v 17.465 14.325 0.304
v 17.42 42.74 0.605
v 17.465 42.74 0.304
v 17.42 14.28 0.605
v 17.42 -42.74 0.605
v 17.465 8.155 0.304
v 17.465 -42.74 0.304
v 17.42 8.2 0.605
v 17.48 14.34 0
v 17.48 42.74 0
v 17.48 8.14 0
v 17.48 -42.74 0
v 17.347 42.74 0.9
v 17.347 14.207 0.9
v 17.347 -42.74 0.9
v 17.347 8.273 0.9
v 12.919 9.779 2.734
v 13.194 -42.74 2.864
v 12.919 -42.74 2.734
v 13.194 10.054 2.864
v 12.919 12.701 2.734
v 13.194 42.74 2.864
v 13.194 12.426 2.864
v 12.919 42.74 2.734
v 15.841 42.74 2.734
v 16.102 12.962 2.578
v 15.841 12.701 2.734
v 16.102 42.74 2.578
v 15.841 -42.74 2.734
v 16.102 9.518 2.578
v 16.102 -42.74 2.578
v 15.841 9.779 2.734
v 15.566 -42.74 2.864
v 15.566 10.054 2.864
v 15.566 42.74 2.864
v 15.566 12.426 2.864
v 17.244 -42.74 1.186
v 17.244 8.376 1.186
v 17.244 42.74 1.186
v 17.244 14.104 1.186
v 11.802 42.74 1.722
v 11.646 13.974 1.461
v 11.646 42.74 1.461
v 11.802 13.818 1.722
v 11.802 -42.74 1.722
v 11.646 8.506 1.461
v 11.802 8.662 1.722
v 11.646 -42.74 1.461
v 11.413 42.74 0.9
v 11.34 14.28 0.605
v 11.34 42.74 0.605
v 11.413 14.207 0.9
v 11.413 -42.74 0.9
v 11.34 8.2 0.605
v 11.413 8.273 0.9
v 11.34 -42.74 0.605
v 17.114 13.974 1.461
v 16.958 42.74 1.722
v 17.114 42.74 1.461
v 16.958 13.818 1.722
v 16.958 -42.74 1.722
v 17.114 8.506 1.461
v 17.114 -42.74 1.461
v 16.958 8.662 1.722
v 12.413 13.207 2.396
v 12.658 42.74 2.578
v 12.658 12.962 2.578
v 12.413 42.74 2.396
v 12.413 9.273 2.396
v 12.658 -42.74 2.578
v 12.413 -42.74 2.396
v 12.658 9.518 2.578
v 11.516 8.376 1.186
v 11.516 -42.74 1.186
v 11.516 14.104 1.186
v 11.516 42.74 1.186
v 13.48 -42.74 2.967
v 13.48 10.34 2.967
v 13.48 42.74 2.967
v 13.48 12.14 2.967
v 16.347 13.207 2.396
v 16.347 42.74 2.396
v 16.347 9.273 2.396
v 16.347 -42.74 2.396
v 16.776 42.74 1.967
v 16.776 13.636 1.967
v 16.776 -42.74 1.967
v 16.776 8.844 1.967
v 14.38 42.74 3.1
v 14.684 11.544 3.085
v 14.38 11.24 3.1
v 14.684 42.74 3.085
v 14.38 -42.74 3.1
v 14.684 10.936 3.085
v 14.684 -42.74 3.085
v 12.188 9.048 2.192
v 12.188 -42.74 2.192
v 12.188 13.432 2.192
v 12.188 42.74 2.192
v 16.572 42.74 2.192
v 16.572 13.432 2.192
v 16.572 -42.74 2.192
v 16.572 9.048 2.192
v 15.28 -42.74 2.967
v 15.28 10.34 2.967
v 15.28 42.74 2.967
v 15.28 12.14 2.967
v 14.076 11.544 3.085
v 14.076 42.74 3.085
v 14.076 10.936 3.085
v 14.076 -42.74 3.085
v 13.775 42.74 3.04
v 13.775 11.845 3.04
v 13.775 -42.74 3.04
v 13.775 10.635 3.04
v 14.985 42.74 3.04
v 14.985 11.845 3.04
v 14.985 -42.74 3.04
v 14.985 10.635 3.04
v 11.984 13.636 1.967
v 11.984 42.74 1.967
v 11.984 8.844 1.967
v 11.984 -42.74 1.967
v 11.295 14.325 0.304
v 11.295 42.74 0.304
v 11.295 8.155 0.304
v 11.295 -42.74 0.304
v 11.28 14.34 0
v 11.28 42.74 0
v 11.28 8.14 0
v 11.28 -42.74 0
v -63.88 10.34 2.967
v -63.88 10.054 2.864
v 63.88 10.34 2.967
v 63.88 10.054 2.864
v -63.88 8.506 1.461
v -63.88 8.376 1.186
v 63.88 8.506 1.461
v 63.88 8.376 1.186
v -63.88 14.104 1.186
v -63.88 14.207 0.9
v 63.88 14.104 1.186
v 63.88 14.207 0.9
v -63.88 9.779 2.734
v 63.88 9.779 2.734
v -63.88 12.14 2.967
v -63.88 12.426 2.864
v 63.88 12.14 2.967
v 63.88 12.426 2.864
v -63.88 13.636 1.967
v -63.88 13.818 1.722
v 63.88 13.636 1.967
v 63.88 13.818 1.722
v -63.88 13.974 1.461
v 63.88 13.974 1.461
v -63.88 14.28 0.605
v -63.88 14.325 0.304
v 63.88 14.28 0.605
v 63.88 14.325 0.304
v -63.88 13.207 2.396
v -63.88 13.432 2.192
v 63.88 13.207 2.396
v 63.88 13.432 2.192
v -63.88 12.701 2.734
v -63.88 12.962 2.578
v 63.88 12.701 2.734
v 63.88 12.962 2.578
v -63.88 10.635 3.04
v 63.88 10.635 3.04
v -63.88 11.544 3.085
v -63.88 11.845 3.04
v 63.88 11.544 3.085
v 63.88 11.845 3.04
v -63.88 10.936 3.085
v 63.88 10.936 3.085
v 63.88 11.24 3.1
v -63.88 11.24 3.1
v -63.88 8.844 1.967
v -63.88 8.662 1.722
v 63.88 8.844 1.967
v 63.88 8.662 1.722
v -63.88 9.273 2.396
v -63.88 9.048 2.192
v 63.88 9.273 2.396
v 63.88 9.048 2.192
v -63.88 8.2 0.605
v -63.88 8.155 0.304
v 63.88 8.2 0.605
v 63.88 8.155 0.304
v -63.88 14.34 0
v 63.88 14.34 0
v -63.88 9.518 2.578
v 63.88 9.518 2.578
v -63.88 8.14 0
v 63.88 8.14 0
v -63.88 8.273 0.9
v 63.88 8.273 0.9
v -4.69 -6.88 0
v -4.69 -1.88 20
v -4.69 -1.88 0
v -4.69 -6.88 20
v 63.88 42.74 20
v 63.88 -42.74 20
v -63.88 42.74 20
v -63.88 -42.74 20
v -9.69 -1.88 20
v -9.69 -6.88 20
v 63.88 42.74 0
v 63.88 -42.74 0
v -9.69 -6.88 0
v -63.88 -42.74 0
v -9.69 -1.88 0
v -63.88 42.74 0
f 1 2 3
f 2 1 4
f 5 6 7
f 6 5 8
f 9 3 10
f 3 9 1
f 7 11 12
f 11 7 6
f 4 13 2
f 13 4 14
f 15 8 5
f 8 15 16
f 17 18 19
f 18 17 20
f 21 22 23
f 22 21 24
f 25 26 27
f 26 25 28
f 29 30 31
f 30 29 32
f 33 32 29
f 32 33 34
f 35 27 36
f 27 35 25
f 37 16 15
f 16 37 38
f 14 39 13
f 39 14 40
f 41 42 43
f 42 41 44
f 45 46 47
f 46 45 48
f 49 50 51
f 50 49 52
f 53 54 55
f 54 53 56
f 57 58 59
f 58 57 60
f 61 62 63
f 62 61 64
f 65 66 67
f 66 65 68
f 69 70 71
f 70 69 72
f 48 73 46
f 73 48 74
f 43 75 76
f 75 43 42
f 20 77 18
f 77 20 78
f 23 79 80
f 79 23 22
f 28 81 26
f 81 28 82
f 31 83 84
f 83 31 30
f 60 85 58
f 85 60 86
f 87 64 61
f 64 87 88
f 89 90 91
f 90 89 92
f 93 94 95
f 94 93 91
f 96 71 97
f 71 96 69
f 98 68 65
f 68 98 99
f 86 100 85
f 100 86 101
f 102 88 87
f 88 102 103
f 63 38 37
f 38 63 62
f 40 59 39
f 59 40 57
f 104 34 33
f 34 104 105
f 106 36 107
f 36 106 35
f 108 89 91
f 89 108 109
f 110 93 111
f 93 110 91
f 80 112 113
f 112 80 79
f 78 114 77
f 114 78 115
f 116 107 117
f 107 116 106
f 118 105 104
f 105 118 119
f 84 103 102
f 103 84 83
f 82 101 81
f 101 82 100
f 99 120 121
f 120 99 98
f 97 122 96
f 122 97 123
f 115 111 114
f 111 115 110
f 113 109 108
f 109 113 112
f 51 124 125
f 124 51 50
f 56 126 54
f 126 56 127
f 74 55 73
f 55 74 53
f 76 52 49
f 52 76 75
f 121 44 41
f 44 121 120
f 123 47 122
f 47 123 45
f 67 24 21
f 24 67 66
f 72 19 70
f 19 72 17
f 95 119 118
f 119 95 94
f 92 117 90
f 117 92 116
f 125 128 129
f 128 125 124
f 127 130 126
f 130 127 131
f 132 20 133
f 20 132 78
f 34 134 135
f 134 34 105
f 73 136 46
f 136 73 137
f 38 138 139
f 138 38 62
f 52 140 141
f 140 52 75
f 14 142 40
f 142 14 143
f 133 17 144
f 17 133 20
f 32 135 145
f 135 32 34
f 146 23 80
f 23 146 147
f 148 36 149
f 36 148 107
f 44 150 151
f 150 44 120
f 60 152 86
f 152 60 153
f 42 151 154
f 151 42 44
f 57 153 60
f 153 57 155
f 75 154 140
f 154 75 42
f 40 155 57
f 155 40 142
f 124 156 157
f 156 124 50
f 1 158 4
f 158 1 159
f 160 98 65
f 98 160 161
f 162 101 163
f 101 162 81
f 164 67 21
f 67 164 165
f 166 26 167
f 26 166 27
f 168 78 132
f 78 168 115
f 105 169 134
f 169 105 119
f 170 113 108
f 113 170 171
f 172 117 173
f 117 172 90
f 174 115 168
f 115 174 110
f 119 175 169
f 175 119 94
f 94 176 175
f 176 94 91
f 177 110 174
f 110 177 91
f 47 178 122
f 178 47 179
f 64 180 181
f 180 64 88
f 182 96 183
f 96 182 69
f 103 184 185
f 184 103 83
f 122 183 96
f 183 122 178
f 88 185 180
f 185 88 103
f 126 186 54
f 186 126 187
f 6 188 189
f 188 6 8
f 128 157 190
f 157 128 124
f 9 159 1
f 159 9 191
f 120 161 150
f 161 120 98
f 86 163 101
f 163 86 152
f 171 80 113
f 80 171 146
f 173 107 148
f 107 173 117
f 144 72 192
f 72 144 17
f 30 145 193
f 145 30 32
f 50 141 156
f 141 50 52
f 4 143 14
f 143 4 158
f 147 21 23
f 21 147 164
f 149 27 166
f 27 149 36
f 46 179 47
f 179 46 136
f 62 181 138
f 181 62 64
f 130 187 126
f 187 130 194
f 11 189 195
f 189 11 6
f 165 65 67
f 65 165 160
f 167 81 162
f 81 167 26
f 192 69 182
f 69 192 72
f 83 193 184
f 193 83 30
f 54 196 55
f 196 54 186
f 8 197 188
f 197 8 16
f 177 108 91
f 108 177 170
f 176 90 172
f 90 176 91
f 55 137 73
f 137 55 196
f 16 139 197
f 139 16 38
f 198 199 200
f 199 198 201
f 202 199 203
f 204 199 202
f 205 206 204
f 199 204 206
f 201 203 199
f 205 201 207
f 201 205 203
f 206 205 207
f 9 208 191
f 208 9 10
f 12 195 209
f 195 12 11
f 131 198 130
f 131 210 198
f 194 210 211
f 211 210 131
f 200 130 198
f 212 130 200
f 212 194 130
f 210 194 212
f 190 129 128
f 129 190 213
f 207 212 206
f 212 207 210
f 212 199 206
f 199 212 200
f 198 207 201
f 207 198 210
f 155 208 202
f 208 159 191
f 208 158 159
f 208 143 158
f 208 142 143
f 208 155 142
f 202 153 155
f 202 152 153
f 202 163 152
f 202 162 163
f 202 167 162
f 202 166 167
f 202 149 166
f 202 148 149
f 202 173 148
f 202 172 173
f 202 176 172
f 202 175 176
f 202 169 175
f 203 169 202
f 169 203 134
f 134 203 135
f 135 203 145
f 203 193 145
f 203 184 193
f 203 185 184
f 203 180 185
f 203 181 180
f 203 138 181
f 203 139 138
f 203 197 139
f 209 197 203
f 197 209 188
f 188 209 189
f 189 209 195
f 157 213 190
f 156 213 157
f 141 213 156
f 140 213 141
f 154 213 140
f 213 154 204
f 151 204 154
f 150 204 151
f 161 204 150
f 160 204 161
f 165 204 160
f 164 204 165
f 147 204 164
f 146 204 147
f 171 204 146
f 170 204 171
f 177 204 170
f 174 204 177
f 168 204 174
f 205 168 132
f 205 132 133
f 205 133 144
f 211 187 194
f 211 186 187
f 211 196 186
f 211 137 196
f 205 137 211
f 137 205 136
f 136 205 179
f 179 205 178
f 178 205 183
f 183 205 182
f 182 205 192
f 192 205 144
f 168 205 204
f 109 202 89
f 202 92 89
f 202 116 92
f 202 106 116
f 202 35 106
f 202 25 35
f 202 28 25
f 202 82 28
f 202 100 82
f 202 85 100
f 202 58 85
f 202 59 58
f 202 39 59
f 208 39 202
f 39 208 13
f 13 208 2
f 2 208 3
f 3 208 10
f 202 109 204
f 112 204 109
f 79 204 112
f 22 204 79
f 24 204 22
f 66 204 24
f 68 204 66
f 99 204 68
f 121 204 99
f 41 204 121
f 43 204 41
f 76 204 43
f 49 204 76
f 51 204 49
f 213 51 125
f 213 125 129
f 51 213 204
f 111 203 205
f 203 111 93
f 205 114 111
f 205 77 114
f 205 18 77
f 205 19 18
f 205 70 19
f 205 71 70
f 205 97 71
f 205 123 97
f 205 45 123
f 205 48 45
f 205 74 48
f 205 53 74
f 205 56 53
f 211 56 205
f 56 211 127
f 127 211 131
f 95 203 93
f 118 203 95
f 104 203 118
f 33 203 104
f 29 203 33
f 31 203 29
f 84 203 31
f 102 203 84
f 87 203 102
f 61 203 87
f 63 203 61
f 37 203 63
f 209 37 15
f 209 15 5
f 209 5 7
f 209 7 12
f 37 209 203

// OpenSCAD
// Built by bench/smallmodels/features/compiler.py from a list of features.
$fn = 64;
difference() {
  union() {
    translate([0, 0, 0]) translate([-63.88, -42.74, 0]) cube([127.76, 85.48, 20]);
  }
  union() {
    translate([14.38, 11.24, 0]) rotate([0, 0, 0]) rotate([90, 0, 0]) cylinder(d = 6.2, h = 1080, center = true);
    translate([14.38, 11.24, 0]) rotate([0, 0, 0]) rotate([0, 90, 0]) cylinder(d = 6.2, h = 1080, center = true);
    translate([-7.19, -4.38, 0]) rotate([0, 0, 0]) translate([-2.5, -2.5, 0]) cube([5, 5, 20]);
  }
}
